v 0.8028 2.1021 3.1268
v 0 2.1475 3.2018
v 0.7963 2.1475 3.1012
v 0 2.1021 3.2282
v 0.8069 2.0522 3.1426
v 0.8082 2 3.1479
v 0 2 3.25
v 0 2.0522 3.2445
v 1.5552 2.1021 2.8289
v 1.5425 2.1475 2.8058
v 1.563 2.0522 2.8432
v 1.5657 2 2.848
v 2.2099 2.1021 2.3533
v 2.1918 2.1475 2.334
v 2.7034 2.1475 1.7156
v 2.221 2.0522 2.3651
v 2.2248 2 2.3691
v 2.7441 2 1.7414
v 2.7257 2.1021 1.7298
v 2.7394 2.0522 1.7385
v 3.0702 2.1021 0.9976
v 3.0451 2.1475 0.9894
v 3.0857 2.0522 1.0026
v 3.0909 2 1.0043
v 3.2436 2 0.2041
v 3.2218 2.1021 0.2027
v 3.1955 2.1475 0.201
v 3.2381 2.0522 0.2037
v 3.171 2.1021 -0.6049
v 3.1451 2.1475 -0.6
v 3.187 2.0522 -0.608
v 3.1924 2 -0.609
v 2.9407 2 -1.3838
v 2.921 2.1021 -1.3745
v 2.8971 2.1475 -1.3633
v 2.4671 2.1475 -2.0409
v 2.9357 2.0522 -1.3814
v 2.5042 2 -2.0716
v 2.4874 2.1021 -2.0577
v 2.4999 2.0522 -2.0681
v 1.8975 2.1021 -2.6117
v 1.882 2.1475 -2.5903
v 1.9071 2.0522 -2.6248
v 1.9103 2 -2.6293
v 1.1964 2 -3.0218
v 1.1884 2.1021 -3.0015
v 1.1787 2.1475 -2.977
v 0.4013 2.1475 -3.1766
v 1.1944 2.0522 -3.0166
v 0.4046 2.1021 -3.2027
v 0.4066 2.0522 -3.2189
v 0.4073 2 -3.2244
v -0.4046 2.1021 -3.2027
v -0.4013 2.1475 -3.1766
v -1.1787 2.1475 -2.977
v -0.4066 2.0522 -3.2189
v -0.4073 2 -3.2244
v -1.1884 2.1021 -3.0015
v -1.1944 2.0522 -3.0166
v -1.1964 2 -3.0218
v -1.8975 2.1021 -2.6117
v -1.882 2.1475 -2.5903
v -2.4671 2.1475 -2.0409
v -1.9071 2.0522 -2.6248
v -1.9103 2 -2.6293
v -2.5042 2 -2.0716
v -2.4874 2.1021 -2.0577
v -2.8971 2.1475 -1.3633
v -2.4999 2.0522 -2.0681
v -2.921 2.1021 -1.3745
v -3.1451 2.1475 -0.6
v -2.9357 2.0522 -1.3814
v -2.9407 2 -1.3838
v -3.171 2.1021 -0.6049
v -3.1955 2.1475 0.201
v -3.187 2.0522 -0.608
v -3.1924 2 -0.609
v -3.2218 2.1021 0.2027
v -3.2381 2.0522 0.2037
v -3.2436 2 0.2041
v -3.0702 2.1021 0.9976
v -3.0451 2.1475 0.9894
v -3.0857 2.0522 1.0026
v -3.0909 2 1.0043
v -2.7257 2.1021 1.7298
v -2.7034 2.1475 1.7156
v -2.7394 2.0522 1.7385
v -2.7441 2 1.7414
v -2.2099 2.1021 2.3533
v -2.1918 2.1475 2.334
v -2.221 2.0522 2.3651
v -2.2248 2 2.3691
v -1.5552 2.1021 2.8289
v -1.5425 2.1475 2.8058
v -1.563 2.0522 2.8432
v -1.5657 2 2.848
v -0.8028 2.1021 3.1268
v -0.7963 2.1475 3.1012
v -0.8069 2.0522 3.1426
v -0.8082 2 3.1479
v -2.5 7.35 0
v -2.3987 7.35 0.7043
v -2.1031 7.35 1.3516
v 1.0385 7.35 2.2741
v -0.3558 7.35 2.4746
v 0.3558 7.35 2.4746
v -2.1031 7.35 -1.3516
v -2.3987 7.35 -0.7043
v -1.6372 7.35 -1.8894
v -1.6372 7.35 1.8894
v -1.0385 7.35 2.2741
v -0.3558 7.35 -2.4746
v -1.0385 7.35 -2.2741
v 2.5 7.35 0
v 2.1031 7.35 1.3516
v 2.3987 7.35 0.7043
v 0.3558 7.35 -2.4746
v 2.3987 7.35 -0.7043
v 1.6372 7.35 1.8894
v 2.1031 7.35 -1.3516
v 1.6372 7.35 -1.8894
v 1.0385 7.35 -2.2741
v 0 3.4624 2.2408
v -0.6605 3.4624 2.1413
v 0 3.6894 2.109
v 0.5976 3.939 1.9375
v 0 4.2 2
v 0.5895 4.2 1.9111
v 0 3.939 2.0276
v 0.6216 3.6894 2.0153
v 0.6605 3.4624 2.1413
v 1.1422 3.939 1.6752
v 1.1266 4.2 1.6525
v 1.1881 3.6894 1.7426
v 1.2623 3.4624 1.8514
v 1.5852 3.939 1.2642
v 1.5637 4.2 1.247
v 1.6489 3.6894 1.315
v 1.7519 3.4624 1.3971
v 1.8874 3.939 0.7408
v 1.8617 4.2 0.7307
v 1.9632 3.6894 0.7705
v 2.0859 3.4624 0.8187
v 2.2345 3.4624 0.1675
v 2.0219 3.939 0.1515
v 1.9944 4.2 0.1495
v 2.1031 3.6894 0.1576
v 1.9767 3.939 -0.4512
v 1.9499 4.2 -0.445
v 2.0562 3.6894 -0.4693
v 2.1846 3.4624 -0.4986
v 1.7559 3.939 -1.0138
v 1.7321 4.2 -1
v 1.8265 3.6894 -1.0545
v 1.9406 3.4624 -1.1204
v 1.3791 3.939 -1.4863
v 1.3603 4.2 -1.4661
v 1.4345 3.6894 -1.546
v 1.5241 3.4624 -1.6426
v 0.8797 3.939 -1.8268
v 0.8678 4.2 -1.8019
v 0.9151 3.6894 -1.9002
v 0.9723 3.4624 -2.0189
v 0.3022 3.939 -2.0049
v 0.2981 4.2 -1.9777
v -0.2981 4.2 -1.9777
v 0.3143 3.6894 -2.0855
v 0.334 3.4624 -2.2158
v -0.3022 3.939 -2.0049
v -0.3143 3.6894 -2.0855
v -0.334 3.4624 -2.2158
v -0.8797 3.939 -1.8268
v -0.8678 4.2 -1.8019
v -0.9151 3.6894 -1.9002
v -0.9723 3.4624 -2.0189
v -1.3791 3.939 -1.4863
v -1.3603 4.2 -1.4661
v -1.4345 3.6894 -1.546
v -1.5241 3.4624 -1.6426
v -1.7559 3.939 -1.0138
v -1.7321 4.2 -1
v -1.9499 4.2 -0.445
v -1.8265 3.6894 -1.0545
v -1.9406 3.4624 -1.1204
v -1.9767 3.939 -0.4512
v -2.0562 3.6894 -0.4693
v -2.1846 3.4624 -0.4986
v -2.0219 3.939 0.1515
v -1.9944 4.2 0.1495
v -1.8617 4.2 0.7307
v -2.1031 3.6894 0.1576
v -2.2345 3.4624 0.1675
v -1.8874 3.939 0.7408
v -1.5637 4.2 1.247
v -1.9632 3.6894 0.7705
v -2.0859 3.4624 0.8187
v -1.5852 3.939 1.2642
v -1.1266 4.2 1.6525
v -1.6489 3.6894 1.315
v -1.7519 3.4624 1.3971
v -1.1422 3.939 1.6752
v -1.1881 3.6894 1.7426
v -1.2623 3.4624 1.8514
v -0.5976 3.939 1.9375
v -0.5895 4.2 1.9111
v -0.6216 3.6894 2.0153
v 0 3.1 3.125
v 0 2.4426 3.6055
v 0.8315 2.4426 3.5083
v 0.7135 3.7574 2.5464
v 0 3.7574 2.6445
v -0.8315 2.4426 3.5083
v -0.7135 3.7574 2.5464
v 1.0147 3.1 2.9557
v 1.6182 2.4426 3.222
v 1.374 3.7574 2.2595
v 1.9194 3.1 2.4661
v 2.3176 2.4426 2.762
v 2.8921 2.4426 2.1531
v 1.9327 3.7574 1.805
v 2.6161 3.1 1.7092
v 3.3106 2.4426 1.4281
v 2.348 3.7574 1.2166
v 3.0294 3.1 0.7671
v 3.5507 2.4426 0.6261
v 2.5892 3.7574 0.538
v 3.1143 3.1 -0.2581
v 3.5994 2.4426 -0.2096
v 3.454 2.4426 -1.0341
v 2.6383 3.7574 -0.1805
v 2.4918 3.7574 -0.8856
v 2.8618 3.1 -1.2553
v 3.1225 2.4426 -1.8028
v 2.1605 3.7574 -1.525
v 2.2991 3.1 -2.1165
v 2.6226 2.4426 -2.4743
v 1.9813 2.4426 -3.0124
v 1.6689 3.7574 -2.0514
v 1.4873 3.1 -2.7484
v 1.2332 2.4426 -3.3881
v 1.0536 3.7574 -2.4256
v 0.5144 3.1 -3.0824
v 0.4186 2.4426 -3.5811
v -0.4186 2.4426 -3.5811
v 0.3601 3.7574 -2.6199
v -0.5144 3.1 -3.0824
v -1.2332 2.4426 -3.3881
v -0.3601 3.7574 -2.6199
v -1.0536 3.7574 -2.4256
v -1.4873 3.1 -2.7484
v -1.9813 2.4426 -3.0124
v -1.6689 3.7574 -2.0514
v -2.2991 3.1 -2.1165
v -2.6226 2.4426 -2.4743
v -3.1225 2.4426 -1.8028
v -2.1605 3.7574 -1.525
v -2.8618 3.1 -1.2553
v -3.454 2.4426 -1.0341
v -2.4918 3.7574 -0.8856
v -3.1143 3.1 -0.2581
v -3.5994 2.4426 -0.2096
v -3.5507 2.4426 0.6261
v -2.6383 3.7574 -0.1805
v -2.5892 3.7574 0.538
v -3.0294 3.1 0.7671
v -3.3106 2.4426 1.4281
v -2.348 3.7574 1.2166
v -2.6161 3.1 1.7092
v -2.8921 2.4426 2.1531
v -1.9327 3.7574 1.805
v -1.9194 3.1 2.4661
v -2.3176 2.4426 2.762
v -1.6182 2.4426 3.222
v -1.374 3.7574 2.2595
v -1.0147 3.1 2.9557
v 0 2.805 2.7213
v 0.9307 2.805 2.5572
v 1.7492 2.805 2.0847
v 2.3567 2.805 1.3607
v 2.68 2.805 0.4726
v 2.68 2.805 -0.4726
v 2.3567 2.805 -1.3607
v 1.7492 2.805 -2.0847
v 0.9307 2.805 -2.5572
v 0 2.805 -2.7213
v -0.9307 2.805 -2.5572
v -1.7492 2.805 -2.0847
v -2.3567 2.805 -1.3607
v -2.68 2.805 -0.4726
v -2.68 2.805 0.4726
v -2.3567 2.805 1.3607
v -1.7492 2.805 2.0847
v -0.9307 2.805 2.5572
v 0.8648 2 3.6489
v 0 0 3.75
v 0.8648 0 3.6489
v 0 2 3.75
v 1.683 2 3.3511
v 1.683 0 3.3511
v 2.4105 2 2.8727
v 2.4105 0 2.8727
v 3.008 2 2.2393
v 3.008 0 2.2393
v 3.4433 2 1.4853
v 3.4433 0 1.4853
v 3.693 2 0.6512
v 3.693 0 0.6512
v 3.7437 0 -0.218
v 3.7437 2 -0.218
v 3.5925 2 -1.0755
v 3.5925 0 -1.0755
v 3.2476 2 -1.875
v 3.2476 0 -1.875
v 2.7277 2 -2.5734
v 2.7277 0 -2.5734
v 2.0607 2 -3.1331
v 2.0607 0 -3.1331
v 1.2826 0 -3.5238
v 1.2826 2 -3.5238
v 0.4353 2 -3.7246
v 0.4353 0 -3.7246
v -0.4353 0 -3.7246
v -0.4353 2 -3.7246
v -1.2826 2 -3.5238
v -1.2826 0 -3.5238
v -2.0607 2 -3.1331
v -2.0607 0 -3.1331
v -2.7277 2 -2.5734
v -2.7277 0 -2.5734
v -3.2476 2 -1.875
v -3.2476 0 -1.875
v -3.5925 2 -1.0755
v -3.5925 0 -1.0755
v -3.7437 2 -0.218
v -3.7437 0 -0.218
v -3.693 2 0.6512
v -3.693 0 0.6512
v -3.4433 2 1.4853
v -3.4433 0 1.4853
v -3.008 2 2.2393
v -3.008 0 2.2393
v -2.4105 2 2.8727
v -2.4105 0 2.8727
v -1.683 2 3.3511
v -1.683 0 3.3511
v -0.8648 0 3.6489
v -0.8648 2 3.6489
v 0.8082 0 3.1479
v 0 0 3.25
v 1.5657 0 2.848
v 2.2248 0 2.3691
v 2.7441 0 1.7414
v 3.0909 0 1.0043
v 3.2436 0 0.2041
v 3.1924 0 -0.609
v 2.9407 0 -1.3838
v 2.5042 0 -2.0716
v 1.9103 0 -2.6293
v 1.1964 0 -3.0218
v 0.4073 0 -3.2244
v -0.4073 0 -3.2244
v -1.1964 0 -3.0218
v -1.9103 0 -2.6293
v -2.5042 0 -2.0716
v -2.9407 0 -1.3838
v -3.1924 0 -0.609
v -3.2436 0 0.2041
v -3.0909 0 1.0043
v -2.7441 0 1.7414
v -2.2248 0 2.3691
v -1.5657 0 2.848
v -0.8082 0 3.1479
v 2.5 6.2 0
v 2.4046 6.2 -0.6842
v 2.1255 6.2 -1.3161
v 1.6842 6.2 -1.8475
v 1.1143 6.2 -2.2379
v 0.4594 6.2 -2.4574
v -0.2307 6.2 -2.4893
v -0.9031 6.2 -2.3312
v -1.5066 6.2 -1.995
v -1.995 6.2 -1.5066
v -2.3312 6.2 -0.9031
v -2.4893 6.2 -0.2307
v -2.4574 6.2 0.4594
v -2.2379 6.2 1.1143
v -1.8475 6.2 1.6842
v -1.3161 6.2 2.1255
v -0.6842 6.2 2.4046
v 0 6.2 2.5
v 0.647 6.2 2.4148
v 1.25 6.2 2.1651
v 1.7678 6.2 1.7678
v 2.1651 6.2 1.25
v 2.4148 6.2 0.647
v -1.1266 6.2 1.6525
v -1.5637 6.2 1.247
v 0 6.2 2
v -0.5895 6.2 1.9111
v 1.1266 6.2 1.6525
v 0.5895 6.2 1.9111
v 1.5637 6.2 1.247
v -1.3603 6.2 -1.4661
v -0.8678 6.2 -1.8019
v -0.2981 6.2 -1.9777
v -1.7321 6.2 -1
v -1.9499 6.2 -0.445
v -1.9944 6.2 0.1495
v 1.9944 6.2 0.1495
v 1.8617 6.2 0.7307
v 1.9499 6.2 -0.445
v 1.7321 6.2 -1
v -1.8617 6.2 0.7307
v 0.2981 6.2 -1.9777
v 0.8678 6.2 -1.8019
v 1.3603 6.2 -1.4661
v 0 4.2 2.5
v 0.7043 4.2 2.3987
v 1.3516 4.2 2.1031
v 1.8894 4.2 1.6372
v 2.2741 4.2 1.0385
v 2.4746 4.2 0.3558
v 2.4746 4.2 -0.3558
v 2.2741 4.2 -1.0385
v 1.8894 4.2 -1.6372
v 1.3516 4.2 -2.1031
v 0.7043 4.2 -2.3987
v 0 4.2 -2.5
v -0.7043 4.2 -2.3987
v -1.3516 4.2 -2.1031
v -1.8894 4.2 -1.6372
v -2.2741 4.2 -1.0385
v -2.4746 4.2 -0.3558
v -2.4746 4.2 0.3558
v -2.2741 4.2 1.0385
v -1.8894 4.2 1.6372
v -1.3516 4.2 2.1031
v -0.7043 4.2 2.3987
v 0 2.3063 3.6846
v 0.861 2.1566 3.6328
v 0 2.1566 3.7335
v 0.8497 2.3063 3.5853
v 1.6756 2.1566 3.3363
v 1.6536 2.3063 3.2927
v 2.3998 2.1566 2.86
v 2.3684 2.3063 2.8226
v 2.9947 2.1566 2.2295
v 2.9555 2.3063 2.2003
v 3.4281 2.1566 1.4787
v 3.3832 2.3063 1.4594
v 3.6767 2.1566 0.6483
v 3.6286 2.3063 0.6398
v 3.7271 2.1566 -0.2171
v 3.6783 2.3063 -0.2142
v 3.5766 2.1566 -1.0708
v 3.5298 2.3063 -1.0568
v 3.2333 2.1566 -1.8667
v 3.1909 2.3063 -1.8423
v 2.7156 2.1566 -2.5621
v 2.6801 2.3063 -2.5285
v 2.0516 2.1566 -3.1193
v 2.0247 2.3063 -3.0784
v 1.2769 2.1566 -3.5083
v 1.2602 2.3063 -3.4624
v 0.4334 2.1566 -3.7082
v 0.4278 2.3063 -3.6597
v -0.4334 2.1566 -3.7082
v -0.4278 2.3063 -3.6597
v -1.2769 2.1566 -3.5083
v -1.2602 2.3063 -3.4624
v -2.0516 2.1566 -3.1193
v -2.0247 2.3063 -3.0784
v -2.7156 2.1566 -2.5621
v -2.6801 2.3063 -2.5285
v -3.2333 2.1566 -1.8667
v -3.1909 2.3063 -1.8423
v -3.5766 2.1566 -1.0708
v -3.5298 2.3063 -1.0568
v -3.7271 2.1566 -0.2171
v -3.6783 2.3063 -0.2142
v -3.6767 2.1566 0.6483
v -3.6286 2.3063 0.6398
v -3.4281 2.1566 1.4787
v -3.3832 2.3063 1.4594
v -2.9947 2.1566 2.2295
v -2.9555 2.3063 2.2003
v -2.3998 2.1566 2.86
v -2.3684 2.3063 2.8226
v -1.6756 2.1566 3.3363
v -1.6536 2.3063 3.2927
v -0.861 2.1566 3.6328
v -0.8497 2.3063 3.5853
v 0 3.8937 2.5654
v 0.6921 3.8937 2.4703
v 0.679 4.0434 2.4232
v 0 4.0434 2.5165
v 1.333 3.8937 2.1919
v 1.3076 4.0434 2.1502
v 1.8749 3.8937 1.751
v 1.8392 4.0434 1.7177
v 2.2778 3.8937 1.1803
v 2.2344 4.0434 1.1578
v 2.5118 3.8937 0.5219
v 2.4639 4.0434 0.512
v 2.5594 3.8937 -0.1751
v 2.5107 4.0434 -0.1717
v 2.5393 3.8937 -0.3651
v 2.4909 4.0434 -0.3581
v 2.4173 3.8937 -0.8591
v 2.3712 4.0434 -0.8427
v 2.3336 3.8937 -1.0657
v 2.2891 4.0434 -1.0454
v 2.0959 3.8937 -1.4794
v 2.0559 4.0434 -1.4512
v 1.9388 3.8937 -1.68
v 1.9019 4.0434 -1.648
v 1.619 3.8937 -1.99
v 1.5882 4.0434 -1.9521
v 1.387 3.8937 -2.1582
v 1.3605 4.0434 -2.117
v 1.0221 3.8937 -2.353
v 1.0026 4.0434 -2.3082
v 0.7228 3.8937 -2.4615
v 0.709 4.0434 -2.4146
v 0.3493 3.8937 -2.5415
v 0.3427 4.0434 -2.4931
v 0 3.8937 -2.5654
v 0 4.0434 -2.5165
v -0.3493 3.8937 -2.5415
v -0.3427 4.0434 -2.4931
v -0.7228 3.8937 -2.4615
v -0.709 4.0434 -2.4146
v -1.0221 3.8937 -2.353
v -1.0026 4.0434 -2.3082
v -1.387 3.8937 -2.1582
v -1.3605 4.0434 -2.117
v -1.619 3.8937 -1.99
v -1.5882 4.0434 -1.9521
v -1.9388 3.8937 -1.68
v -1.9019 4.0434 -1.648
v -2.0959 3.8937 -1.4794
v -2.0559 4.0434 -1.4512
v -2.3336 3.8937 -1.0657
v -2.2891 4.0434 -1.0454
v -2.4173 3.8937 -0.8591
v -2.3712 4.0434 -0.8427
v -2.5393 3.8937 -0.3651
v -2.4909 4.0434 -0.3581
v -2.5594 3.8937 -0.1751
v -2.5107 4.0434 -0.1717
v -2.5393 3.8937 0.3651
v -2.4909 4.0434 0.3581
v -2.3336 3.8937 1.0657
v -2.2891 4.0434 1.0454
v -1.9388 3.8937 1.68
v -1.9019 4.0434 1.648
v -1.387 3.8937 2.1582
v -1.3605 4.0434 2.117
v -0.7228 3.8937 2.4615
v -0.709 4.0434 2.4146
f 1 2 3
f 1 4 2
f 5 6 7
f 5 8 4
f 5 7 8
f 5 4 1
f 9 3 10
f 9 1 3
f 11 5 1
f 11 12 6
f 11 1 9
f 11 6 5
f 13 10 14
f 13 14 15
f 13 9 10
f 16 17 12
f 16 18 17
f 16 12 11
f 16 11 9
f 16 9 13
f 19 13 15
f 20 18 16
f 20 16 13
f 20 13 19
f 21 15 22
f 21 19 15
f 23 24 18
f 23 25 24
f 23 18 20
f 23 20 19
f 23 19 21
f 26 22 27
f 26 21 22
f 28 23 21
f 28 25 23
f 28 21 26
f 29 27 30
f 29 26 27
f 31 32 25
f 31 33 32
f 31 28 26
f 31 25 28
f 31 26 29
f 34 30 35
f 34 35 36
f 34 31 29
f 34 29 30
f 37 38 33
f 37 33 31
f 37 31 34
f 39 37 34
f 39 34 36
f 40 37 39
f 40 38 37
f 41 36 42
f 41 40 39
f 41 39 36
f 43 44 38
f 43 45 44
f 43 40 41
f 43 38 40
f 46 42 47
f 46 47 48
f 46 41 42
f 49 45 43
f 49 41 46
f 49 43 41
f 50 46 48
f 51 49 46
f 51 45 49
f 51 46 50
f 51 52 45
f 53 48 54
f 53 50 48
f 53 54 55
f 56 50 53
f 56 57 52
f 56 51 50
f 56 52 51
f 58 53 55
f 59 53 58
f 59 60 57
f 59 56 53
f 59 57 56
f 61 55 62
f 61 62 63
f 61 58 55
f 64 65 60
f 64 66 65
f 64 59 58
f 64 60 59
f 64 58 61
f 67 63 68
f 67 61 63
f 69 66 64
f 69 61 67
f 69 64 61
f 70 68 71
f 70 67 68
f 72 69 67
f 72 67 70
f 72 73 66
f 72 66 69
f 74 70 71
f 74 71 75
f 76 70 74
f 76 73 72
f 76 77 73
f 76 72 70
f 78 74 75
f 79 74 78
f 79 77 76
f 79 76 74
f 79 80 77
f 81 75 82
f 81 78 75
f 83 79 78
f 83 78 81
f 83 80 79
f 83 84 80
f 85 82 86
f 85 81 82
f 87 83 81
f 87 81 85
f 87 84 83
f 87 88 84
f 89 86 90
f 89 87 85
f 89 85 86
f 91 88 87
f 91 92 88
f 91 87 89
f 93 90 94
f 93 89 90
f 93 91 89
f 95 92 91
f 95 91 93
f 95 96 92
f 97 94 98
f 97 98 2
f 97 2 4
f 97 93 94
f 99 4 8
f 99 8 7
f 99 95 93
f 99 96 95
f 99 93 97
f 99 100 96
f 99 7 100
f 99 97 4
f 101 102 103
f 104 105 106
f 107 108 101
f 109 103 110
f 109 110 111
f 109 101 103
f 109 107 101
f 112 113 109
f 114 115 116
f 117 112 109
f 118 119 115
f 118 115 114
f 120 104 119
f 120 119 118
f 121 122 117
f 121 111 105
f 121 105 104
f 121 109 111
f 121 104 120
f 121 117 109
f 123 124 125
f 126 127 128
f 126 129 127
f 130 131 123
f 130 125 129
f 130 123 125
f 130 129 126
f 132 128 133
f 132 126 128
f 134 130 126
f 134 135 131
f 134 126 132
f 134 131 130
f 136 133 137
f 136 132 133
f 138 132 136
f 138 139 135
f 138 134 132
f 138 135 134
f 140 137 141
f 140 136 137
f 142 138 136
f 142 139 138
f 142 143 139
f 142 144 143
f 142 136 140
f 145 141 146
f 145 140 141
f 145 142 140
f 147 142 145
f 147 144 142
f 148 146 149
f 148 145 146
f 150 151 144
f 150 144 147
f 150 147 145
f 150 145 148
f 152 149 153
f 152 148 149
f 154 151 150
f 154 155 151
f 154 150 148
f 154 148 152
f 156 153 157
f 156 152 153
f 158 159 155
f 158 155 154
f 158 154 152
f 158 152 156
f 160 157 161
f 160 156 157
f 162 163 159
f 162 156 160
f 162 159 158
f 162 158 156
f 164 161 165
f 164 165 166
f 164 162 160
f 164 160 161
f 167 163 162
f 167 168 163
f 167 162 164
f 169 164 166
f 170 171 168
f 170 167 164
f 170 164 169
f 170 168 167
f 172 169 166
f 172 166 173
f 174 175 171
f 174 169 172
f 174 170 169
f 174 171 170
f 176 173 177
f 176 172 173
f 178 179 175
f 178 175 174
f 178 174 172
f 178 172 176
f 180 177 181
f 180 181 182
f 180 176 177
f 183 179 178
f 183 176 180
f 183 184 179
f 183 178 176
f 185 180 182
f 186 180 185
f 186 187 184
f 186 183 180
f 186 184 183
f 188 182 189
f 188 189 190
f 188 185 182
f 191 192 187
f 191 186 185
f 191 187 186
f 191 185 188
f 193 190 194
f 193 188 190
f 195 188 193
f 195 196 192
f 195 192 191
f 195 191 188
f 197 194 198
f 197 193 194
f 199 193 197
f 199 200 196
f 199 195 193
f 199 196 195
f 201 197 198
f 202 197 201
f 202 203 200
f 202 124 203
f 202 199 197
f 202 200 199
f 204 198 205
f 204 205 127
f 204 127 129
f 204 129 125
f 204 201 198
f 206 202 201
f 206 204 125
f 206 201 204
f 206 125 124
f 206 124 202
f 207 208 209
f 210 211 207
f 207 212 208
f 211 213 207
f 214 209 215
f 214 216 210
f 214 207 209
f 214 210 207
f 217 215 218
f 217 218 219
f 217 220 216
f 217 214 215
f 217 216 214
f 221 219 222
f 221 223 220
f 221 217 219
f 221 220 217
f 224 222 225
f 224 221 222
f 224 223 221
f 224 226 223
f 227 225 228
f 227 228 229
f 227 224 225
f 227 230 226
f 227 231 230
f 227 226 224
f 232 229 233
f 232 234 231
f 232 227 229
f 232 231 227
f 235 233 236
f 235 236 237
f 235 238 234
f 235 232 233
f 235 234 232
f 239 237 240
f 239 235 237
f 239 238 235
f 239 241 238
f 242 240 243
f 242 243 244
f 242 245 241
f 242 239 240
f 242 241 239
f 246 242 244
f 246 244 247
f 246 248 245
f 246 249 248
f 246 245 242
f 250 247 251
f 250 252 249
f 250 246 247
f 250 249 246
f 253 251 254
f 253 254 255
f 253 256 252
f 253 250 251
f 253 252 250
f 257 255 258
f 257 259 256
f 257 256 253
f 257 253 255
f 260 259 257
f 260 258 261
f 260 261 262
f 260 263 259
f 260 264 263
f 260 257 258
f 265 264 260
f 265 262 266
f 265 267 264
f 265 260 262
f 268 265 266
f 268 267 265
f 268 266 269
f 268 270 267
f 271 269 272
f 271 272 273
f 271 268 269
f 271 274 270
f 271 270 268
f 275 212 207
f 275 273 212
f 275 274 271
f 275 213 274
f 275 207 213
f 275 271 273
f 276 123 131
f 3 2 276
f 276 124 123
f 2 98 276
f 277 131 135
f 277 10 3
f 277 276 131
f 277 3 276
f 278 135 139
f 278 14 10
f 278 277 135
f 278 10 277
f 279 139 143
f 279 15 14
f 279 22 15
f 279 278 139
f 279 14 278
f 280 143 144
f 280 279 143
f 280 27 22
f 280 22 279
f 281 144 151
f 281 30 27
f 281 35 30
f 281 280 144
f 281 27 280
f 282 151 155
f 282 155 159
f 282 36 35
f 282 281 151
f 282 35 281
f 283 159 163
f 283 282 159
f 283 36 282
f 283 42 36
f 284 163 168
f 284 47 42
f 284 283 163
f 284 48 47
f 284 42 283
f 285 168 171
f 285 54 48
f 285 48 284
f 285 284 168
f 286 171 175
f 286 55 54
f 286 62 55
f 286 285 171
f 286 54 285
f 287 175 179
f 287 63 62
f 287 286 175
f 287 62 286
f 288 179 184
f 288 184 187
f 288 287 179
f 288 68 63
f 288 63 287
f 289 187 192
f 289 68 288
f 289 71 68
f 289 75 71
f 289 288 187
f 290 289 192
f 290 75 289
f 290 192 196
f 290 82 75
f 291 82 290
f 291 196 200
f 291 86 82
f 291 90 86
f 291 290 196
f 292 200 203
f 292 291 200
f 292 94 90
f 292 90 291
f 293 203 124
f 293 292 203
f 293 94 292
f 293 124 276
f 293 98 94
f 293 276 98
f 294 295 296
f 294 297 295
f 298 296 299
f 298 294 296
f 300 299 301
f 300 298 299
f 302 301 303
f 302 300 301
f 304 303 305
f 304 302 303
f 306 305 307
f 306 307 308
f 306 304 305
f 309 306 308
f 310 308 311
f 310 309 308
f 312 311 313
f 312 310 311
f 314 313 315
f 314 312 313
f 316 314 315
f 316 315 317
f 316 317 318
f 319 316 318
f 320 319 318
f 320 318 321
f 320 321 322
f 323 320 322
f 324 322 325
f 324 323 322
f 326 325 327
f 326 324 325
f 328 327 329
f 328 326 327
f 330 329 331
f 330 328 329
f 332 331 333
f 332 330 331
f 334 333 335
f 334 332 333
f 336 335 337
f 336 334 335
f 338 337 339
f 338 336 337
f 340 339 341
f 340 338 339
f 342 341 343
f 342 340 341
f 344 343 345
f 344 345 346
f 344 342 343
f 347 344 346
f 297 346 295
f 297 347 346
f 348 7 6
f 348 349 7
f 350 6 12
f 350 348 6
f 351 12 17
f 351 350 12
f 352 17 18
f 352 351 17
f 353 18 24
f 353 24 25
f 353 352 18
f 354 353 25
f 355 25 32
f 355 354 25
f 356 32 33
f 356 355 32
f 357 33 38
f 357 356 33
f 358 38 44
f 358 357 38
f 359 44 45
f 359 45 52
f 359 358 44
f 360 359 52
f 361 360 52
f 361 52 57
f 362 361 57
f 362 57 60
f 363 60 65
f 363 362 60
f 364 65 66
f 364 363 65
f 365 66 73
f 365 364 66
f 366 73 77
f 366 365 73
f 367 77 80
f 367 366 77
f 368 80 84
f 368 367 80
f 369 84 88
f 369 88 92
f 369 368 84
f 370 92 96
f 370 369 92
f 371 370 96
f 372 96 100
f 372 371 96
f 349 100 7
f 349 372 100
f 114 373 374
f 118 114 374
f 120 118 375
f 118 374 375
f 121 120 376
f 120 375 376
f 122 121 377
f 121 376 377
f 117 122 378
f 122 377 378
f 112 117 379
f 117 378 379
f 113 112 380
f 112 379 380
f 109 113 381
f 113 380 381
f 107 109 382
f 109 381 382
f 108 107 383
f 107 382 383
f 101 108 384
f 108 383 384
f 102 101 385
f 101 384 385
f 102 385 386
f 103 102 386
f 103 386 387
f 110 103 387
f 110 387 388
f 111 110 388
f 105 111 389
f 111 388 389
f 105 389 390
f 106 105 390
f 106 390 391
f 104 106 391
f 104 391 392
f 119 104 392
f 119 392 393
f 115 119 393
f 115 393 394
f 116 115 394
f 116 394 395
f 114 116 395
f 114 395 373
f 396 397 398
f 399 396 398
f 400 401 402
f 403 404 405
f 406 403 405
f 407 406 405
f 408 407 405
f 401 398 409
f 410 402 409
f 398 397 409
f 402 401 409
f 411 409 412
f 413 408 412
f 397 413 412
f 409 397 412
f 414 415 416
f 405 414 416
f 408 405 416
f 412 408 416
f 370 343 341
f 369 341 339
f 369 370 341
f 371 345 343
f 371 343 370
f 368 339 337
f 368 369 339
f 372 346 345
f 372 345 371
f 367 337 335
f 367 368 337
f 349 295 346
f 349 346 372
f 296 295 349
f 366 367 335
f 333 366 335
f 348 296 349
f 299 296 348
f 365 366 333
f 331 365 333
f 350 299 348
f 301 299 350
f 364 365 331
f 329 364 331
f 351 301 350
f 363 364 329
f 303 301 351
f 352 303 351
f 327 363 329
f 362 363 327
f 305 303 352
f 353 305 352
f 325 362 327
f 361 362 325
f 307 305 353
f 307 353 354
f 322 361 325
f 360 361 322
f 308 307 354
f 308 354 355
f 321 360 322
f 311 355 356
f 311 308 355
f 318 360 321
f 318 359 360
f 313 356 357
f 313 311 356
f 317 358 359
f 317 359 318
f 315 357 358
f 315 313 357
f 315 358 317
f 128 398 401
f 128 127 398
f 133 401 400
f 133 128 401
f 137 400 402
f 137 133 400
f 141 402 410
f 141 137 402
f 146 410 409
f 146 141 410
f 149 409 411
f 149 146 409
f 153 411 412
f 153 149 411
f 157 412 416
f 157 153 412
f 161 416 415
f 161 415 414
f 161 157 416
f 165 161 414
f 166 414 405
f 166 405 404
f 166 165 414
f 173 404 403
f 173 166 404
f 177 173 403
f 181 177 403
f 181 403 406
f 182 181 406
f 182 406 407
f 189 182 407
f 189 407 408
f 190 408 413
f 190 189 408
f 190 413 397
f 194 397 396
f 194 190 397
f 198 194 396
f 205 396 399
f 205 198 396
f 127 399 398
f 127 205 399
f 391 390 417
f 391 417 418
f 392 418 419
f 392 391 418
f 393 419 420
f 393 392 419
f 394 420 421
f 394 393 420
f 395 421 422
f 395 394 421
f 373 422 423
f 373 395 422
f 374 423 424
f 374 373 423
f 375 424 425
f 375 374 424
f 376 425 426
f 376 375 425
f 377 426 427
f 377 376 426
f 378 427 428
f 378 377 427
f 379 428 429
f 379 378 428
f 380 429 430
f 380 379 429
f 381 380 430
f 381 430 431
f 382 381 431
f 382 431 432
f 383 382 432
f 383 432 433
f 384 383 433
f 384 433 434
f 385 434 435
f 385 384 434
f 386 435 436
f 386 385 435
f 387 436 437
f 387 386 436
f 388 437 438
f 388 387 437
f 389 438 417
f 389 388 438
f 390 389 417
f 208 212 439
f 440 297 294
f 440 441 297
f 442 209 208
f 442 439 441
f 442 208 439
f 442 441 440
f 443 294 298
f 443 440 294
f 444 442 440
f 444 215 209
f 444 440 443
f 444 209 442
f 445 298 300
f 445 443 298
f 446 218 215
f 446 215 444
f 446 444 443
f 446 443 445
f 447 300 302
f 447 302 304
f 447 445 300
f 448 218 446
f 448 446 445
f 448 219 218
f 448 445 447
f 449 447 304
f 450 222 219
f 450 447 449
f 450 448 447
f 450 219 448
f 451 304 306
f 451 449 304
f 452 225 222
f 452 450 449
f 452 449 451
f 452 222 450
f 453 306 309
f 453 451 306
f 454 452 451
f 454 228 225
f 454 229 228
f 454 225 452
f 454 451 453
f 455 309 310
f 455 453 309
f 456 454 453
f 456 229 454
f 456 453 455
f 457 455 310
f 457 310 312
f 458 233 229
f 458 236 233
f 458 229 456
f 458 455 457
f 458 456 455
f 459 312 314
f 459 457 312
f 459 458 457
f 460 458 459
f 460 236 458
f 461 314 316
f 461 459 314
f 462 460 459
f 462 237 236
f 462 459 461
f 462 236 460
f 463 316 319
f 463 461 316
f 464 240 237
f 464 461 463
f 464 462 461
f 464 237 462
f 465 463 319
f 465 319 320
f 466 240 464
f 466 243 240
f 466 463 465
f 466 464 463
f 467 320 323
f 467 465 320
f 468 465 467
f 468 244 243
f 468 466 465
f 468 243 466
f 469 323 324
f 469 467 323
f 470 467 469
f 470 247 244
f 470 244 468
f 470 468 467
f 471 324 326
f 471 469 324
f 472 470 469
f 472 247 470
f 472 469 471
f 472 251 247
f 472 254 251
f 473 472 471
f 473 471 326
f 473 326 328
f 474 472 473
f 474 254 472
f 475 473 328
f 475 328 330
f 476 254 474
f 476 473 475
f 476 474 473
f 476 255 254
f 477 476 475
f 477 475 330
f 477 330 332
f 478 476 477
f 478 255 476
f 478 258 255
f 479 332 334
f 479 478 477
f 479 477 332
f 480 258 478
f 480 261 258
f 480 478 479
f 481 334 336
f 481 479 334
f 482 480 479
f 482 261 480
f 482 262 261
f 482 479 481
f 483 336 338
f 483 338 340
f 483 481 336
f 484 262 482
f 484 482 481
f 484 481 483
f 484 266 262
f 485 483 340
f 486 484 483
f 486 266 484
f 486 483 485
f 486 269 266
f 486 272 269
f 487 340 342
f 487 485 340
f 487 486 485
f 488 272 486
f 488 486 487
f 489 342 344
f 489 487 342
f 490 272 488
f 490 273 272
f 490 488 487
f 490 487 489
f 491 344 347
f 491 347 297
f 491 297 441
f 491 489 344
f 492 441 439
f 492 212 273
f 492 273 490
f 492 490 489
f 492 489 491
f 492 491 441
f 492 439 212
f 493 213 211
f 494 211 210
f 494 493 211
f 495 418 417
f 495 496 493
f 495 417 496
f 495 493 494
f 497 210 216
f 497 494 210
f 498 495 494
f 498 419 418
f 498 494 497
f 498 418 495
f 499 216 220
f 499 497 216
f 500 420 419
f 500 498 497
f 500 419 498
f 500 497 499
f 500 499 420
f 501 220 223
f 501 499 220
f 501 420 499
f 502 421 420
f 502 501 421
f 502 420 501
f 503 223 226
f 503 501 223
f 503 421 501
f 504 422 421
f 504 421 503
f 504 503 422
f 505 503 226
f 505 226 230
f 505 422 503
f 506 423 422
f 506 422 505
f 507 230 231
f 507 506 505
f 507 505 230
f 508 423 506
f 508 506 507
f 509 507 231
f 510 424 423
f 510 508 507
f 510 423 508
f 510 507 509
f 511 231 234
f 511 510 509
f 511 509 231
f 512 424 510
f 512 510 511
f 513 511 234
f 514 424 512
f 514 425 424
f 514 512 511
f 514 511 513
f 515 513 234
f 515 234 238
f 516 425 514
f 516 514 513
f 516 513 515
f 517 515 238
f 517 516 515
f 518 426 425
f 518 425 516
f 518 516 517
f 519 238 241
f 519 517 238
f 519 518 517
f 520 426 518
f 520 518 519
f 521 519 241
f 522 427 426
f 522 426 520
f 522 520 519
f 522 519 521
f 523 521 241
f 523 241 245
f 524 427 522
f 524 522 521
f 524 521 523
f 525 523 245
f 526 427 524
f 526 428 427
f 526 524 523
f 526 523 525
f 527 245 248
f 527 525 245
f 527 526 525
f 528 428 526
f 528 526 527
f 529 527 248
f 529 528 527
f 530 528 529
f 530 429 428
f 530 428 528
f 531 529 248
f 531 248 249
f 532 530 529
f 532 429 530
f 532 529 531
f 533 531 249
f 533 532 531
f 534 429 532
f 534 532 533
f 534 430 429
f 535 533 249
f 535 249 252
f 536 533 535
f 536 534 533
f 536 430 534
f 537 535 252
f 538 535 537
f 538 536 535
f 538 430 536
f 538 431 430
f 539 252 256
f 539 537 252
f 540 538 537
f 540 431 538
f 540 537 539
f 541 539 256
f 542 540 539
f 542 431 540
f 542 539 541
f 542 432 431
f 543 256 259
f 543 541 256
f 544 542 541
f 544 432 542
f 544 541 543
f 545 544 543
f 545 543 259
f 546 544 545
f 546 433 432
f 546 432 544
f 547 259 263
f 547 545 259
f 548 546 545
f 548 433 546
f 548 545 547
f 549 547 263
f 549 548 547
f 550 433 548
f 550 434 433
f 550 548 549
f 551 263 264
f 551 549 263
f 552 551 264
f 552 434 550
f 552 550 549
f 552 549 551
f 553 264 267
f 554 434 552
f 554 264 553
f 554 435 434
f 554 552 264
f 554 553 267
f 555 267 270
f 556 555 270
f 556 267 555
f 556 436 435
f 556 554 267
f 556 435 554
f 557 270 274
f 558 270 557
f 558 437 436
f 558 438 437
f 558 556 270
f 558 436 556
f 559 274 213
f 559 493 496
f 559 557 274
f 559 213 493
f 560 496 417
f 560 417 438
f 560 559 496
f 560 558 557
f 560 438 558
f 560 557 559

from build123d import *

# Parameters (mm, degrees)
SKETCH8_R           = 2.5
BOSS_EXTRUDE1_DEPTH = 1.15


with BuildPart() as part:
    # Sketch6 → Revolve-Thin2 (revolve)
    with BuildSketch(Plane(origin=(0, 0, 0), x_dir=(0, 0, -1), z_dir=(1, 0, 0))):
        with BuildLine():
            Line((-3.75, 0), (-3.75, 2))
            ThreePointArc((-3.75, 2), (-3.712963507, 2.232772503), (-3.605511899, 2.442555466))
            Line((-3.605511899, 2.442555466), (-2.644488101, 3.757444534))
            ThreePointArc((-2.644488101, 3.757444534), (-2.537036493, 3.967227497), (-2.5, 4.2))
            Line((-2.5, 4.2), (-2.5, 6.2))
            Line((-2.5, 6.2), (-2, 6.2))
            Line((-2, 6.2), (-2, 4.2))
            ThreePointArc((-2, 4.2), (-2.061727489, 3.812045829), (-2.240813502, 3.462407557))
            Line((-2.240813502, 3.462407557), (-3.2018373, 2.147518489))
            ThreePointArc((-3.2018373, 2.147518489), (-3.237654502, 2.077590834), (-3.25, 2))
            Line((-3.25, 2), (-3.25, 0))
            Line((-3.25, 0), (-3.75, 0))
        make_face()
    revolve(axis=Axis((0, -0.227579974, 0), (0, 1, 0)))

    # Sketch8 → Boss-Extrude1 (add)
    with BuildSketch(Plane(origin=(0, 6.2, 0), x_dir=(1, 0, 0), z_dir=(0, 1, 0))):
        Circle(SKETCH8_R)
    extrude(amount=BOSS_EXTRUDE1_DEPTH)


solid = part.part
